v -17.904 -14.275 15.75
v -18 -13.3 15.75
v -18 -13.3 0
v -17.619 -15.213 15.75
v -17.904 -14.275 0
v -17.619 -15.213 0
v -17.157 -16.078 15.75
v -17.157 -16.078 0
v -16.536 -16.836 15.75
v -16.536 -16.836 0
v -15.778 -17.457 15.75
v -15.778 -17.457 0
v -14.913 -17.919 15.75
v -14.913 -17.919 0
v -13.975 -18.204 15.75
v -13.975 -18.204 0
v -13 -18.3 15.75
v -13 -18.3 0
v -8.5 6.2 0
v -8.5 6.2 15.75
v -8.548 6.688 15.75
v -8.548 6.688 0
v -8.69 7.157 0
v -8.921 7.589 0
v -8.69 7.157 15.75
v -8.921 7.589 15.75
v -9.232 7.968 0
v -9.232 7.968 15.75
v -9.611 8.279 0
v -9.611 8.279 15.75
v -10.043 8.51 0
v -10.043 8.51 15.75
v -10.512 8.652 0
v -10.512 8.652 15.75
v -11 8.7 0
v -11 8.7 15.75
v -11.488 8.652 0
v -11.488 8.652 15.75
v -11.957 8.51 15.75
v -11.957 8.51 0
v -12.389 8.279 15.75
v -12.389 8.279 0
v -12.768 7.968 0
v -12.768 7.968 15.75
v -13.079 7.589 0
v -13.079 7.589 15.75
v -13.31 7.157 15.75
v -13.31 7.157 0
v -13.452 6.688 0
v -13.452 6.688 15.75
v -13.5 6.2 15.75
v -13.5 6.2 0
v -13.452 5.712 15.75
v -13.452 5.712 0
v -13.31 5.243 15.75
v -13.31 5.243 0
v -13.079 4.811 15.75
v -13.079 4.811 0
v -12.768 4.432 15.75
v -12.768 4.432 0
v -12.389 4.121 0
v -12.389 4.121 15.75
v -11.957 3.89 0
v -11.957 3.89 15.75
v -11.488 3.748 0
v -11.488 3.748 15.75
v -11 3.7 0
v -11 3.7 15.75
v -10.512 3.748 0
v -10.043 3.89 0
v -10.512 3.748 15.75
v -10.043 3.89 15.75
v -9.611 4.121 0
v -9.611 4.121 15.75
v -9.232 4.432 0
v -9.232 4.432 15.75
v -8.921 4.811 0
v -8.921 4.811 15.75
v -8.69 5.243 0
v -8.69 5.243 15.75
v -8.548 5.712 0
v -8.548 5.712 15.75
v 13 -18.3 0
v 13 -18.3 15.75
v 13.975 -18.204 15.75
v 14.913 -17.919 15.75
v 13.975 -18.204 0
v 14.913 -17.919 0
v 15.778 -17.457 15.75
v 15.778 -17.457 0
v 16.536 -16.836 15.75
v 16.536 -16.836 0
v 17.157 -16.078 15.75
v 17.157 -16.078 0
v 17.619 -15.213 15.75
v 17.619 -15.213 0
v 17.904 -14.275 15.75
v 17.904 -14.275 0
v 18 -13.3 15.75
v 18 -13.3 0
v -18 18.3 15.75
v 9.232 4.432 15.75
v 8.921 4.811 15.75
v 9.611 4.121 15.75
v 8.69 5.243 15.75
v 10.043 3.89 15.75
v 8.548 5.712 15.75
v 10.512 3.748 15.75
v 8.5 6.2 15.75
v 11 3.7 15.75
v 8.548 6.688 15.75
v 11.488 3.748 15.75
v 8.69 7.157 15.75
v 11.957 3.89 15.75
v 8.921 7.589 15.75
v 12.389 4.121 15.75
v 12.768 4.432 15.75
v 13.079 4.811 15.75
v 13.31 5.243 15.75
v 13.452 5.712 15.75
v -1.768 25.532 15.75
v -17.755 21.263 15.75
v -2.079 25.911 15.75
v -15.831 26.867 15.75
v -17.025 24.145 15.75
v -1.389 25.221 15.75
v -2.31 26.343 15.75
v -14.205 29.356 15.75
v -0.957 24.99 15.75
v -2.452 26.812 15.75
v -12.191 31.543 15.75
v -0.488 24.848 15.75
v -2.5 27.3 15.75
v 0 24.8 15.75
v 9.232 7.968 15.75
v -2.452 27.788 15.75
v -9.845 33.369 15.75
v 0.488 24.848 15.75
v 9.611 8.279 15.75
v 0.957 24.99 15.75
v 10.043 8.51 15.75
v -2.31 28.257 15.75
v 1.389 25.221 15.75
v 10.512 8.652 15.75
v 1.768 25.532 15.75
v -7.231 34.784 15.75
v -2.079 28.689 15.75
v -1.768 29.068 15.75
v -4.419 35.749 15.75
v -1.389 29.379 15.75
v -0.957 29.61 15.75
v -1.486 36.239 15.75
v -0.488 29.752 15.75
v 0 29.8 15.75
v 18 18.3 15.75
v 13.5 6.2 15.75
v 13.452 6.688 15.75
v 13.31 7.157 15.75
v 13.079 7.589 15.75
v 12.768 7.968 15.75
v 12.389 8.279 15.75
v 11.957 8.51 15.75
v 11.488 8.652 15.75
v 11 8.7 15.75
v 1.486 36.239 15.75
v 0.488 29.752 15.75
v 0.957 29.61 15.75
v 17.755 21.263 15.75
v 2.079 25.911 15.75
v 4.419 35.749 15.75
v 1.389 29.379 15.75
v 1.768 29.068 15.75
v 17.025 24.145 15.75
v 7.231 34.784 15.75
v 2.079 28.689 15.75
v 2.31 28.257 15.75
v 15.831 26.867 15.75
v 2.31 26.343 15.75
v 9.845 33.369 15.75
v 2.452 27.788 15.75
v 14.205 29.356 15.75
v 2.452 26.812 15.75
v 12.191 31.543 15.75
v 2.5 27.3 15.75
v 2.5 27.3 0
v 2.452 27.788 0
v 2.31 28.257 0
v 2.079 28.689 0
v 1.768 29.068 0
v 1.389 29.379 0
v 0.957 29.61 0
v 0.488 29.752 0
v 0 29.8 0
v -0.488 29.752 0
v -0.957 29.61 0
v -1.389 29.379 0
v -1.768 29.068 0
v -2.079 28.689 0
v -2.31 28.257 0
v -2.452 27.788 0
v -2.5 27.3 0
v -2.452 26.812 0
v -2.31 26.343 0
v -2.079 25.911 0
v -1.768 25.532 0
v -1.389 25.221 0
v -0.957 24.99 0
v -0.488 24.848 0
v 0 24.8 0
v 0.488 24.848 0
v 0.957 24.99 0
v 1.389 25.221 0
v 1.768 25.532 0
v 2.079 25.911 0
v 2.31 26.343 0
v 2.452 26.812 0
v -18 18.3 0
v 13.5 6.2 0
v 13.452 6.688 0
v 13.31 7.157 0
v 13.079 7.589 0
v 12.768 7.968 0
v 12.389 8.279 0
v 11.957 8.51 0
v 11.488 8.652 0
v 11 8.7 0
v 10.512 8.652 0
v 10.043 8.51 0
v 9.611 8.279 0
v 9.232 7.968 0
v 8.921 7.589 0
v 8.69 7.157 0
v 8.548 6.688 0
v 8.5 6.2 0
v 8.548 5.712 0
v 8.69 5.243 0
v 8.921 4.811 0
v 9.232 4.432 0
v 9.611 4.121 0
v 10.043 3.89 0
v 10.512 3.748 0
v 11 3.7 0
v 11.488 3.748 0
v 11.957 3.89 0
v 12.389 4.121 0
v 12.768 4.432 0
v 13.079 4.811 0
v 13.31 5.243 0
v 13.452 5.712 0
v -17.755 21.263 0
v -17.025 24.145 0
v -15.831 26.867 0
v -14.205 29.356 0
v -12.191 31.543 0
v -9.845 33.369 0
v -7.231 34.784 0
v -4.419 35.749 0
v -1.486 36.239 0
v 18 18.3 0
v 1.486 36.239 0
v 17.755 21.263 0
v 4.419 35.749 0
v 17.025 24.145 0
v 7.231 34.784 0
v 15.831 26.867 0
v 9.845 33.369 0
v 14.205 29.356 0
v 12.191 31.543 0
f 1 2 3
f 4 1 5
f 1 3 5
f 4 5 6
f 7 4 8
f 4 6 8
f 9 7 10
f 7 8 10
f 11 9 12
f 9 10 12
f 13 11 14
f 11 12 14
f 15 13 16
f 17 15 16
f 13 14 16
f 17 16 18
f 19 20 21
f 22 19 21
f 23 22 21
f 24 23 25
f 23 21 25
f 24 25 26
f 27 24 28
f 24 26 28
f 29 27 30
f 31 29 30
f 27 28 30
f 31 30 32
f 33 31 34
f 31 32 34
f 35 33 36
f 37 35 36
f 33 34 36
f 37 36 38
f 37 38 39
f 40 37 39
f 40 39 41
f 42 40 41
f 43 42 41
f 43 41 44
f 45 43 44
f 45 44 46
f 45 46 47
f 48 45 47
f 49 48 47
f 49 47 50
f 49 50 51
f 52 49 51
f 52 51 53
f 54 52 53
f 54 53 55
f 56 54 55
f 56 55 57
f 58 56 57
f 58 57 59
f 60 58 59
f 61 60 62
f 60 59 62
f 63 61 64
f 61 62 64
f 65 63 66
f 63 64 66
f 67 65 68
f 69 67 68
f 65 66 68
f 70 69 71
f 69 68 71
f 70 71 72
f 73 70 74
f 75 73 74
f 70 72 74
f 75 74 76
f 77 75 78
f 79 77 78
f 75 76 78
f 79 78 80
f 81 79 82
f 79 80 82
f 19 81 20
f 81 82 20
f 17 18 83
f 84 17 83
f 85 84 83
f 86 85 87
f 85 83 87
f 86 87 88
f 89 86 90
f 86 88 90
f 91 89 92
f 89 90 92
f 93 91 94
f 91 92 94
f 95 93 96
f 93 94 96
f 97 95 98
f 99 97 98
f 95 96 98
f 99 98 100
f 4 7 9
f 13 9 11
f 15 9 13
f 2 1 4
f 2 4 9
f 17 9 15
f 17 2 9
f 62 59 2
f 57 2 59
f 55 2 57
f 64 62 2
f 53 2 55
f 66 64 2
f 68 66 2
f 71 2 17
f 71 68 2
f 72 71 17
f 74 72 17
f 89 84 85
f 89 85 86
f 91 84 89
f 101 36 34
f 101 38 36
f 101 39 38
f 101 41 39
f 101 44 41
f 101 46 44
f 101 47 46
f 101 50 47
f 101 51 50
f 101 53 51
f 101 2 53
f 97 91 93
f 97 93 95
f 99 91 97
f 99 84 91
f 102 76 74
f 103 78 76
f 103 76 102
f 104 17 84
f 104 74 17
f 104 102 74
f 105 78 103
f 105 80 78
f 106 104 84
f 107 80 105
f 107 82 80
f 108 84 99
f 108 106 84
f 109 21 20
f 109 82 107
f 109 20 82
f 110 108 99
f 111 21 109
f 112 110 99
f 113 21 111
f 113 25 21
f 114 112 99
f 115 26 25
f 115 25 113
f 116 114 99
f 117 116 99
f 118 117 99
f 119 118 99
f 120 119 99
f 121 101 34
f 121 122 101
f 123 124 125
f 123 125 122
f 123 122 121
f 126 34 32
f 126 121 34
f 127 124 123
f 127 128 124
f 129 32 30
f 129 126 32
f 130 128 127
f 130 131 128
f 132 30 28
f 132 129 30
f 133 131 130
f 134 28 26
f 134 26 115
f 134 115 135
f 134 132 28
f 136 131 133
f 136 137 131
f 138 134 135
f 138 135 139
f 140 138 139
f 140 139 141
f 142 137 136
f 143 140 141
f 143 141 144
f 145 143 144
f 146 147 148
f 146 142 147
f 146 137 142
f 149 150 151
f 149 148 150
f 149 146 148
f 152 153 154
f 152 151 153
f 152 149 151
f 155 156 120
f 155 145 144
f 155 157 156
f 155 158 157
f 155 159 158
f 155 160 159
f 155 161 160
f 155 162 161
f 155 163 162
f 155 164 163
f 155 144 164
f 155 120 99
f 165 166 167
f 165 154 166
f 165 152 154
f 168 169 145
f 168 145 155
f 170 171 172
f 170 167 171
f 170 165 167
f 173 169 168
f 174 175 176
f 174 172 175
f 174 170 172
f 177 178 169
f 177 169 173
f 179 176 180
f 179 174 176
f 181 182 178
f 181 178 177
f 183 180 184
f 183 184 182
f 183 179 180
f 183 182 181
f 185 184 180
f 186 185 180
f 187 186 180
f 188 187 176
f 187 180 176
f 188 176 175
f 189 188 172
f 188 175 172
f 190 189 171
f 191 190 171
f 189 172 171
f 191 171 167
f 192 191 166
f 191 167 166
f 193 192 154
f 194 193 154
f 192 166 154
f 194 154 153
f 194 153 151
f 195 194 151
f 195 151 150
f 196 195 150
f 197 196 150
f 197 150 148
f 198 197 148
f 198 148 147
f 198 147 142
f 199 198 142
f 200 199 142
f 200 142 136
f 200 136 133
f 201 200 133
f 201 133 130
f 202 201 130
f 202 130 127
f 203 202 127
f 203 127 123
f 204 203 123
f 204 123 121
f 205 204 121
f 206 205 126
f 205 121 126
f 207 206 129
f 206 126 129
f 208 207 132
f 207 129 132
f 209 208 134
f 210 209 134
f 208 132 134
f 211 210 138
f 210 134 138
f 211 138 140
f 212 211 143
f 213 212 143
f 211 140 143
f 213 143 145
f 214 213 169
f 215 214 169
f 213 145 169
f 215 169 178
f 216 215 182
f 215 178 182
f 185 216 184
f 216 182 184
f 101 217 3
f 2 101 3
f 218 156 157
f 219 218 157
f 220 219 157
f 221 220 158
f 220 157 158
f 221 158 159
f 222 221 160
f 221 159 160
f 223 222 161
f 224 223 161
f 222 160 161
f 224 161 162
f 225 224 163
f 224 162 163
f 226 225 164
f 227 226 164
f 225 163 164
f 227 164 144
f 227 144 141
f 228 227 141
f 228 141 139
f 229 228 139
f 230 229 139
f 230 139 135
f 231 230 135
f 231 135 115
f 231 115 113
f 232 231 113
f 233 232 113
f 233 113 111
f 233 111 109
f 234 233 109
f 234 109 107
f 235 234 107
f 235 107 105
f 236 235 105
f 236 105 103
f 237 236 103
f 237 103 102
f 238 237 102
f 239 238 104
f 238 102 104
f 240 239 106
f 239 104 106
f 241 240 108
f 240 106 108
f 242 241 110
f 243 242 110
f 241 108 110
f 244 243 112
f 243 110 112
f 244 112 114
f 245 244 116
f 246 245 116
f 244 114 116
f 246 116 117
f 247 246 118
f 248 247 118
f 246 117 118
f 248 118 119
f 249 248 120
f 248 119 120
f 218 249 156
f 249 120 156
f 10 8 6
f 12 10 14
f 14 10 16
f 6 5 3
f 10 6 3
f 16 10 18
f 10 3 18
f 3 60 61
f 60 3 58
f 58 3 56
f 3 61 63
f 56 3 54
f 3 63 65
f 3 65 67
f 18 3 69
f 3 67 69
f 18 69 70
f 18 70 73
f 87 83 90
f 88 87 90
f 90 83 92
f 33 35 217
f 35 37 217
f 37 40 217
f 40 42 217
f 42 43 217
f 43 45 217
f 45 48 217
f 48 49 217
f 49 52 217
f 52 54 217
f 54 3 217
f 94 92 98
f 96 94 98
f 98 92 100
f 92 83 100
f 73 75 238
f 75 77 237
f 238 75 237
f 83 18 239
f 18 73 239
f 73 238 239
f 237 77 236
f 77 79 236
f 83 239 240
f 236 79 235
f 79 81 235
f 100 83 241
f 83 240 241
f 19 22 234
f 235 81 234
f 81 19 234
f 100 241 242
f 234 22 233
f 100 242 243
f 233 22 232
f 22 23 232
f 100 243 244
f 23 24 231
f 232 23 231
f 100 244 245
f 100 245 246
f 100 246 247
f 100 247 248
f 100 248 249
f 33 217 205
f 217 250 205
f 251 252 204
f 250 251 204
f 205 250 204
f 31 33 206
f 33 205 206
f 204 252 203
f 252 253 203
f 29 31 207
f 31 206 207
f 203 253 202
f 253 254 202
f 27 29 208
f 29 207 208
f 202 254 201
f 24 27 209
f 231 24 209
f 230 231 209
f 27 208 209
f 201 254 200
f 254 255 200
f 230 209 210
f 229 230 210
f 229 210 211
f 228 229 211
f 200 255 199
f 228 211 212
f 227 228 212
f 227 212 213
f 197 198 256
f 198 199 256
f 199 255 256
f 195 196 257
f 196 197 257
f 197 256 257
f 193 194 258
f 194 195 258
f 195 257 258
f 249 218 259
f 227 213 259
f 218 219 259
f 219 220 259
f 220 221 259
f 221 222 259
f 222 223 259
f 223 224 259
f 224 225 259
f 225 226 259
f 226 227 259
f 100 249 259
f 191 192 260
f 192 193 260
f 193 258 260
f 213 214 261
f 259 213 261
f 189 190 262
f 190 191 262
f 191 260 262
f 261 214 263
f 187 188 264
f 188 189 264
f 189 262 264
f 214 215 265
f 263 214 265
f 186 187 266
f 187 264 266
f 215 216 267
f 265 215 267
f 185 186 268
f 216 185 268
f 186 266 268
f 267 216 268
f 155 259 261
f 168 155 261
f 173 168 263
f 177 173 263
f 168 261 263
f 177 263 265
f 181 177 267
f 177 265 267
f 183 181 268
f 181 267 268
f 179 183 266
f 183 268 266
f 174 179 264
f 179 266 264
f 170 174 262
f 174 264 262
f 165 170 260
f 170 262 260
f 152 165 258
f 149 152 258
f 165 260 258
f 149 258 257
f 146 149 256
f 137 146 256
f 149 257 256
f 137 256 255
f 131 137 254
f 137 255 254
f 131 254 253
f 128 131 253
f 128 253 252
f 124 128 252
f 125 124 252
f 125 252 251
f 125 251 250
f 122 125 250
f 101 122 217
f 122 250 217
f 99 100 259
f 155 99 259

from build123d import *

# Parameters (mm, degrees)
F1_DEPTH = 15.75
F2_R     = 2.5
F3_DEPTH = 15.751


with BuildPart() as f1:
    # F0 (on Top) → F1 (new body)
    with BuildSketch(Plane.XY):
        with BuildLine():
            ThreePointArc((-18, -13.3), (-16.535534, -16.835534), (-13, -18.3))
            Line((-13, -18.3), (13, -18.3))
            ThreePointArc((13, -18.3), (16.535534, -16.835534), (18, -13.3))
            Line((18, -13.3), (18, 18.3))
            ThreePointArc((18, 18.3), (0, 36.3), (-18, 18.3))
            Line((-18, 18.3), (-18, -13.3))
        make_face()
    extrude(amount=F1_DEPTH)

    # F2 (on face) → F3 (cut, through all)
    with BuildSketch(Plane.XY.offset(15.75)):
        with Locations((0, 27.3)):
            Circle(F2_R)
        with Locations((-11, 6.2)):
            Circle(F2_R)
        with Locations((11, 6.2)):
            Circle(F2_R)
    extrude(amount=-F3_DEPTH, mode=Mode.SUBTRACT)


solid = f1.part
